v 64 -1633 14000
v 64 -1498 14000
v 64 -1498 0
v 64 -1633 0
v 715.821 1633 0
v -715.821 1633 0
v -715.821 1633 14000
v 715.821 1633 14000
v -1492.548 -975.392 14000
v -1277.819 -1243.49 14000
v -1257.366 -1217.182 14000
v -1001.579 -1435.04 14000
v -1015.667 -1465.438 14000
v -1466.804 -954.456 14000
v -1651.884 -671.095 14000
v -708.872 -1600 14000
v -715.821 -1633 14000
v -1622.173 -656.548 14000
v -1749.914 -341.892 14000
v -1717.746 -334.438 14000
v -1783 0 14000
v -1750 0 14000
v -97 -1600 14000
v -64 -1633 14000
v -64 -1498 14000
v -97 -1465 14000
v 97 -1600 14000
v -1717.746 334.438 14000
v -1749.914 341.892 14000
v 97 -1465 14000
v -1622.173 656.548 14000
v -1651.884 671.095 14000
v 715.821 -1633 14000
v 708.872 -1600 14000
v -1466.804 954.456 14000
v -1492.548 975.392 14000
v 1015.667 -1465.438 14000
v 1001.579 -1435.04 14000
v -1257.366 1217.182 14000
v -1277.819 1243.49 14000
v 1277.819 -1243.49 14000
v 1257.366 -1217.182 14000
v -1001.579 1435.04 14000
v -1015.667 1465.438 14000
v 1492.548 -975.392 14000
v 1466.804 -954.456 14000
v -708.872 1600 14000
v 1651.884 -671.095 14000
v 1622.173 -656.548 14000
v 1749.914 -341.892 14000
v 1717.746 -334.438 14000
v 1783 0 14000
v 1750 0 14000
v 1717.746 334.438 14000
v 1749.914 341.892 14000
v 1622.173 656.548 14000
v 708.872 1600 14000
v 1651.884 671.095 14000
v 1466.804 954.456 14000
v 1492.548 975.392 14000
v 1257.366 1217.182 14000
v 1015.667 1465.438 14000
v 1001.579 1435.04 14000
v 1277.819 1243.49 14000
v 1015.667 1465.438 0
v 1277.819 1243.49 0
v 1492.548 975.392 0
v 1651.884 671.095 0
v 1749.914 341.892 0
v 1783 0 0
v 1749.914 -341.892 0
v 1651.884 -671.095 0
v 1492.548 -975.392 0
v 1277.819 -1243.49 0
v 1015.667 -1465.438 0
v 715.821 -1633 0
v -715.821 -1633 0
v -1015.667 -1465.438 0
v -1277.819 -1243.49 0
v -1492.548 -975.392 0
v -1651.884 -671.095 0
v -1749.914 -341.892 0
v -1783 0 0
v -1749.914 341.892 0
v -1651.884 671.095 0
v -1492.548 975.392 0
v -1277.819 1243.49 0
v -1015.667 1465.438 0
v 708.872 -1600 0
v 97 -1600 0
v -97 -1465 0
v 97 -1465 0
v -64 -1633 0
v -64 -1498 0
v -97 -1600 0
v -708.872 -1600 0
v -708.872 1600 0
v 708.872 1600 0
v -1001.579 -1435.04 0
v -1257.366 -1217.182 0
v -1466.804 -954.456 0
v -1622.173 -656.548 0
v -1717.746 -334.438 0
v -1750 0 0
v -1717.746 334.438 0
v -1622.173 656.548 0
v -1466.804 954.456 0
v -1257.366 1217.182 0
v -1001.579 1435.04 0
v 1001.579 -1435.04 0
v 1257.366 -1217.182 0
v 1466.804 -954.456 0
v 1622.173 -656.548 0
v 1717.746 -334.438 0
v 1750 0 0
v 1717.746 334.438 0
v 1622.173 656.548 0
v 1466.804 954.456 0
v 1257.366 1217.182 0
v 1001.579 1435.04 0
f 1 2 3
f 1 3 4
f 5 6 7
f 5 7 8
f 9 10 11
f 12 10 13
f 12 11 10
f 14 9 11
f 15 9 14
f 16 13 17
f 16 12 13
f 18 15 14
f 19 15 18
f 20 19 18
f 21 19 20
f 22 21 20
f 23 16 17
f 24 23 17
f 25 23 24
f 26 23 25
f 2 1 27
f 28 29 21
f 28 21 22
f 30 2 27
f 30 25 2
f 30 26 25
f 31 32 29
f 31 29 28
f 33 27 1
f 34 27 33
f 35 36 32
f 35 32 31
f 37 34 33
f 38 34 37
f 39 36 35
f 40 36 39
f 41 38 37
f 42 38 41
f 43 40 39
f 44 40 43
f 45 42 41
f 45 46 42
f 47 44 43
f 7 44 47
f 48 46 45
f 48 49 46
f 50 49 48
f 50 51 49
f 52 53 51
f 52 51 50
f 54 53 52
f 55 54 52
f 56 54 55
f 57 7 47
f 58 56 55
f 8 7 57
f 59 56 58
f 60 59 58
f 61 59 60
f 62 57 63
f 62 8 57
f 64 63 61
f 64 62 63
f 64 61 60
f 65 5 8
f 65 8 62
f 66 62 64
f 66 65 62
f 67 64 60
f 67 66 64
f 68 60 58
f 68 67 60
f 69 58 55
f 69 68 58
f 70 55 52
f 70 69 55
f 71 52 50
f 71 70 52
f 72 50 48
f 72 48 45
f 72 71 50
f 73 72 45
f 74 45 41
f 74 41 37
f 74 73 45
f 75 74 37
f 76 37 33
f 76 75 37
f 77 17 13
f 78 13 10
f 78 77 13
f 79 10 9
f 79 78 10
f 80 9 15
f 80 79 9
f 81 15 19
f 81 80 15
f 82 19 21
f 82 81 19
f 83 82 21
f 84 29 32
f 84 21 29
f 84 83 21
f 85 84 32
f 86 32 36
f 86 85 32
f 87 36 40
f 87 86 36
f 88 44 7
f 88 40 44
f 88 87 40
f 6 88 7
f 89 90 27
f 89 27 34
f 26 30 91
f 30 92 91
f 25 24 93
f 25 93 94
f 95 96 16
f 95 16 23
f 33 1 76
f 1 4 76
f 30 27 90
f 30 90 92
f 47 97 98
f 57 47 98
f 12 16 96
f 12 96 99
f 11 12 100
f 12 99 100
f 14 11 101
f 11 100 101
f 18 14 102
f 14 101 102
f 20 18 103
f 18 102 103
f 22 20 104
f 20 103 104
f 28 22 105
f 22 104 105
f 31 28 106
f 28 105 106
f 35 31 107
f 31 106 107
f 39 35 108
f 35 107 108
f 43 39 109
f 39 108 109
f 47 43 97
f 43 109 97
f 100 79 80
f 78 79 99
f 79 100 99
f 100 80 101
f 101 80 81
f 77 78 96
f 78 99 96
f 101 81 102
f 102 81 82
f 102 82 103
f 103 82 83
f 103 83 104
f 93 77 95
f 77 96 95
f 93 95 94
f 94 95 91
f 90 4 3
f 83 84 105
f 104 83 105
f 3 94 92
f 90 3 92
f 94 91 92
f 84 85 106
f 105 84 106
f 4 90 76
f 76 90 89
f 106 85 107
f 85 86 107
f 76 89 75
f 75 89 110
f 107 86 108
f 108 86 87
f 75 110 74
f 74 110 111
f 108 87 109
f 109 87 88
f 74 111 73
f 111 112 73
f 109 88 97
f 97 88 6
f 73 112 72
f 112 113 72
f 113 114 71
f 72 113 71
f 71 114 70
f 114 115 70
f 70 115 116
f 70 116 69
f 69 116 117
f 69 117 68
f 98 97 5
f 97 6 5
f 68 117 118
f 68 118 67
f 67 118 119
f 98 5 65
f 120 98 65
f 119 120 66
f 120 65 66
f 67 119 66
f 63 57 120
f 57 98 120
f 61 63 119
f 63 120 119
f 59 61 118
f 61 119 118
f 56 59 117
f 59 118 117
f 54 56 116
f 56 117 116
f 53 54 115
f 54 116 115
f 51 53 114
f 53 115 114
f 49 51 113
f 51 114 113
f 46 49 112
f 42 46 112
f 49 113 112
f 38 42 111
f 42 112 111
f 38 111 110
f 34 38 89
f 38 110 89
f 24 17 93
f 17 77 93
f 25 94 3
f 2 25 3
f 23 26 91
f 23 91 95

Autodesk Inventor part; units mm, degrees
ref_plane "YZ Plane" through (0, 0, 0) normal (1, 0, 0) x (0, 1, 0)
ref_plane "XZ Plane" through (0, 0, 0) normal (0, 1, 0) x (-1, 0, 0)
ref_plane "XY Plane" through (0, 0, 0) normal (0, 0, 1) x (1, 0, 0)
sketch "Sketch1" plane through (0, 0, 0) normal (0, 0, 1) x (1, 0, 0)
  circle A0 centre (0, 0) radius 1783
  circle A1 centre (0, 0) radius 1750
  line L0 (-786.8221, -1600) -> (786.8221, -1600)
  line L1 (-786.8221, 1600) -> (786.8221, 1600)
  line L2 (-715.8212, 1633) -> (715.8212, 1633)
  line L3 (-715.8212, -1633) -> (715.8212, -1633)
  line L4 (-64, -1498) -> (64, -1498)
  line L5 (64, -1498) -> (64, -1600)
  line L6 (64, -1600) -> (-64, -1600)
  line L7 (-64, -1600) -> (-64, -1498)
  line L8 (-64, -1498) -> (64, -1600) construction
  line L9 (64, -1498) -> (-64, -1600) construction
  line L10 (-97, -1633) -> (97, -1633)
  line L11 (97, -1633) -> (97, -1465)
  line L12 (97, -1465) -> (-97, -1465)
  line L13 (-97, -1465) -> (-97, -1633)
  line L14 (-97, -1633) -> (97, -1465) construction
  line L15 (97, -1633) -> (-97, -1465) construction
  line L16 (-64, -1600) -> (-64, -1633)
  line L17 (64, -1600) -> (64, -1633)
  point P0 (0, -1549)
  point P1 (0, -1549)
  point P2 (97, -1600)
  point P3 (-97, -1600)
  point P4 (-708.8723, -1600)
  point P5 (-708.8723, 1600)
  point P6 (708.8723, 1600)
  point P7 (708.8723, -1600)
  point P8 (97, -1633)
  dimension "d0" = 3566
  dimension "d1" = 33
  dimension "d2" = 1600
  dimension "d3" = 1600
  dimension "d4" = 33
  dimension "d5" = 33
  dimension "d6" = 33
  dimension "d7" = 33
  dimension "d8" = 102
  dimension "d9" = 128
extrude "Extrusion1" add sketch "Sketch1" along normal blind 14000 contours A0 L0 A1 L1 | L1 A1 L2 A0 | A0 L3 A1 L0 | L1 A1 L2 | A1 L3 L11 L0 | L2 A1 L1 A0 | A1 L0 A0 L1 | A0 L0 A1 L3 | L11 L3 L17 L0 | L0 L5 L4 L7 L13 L12 L11 | L0 L13 L3 A1 | L0 L16 L3 L13
properties part number "PodShell"
